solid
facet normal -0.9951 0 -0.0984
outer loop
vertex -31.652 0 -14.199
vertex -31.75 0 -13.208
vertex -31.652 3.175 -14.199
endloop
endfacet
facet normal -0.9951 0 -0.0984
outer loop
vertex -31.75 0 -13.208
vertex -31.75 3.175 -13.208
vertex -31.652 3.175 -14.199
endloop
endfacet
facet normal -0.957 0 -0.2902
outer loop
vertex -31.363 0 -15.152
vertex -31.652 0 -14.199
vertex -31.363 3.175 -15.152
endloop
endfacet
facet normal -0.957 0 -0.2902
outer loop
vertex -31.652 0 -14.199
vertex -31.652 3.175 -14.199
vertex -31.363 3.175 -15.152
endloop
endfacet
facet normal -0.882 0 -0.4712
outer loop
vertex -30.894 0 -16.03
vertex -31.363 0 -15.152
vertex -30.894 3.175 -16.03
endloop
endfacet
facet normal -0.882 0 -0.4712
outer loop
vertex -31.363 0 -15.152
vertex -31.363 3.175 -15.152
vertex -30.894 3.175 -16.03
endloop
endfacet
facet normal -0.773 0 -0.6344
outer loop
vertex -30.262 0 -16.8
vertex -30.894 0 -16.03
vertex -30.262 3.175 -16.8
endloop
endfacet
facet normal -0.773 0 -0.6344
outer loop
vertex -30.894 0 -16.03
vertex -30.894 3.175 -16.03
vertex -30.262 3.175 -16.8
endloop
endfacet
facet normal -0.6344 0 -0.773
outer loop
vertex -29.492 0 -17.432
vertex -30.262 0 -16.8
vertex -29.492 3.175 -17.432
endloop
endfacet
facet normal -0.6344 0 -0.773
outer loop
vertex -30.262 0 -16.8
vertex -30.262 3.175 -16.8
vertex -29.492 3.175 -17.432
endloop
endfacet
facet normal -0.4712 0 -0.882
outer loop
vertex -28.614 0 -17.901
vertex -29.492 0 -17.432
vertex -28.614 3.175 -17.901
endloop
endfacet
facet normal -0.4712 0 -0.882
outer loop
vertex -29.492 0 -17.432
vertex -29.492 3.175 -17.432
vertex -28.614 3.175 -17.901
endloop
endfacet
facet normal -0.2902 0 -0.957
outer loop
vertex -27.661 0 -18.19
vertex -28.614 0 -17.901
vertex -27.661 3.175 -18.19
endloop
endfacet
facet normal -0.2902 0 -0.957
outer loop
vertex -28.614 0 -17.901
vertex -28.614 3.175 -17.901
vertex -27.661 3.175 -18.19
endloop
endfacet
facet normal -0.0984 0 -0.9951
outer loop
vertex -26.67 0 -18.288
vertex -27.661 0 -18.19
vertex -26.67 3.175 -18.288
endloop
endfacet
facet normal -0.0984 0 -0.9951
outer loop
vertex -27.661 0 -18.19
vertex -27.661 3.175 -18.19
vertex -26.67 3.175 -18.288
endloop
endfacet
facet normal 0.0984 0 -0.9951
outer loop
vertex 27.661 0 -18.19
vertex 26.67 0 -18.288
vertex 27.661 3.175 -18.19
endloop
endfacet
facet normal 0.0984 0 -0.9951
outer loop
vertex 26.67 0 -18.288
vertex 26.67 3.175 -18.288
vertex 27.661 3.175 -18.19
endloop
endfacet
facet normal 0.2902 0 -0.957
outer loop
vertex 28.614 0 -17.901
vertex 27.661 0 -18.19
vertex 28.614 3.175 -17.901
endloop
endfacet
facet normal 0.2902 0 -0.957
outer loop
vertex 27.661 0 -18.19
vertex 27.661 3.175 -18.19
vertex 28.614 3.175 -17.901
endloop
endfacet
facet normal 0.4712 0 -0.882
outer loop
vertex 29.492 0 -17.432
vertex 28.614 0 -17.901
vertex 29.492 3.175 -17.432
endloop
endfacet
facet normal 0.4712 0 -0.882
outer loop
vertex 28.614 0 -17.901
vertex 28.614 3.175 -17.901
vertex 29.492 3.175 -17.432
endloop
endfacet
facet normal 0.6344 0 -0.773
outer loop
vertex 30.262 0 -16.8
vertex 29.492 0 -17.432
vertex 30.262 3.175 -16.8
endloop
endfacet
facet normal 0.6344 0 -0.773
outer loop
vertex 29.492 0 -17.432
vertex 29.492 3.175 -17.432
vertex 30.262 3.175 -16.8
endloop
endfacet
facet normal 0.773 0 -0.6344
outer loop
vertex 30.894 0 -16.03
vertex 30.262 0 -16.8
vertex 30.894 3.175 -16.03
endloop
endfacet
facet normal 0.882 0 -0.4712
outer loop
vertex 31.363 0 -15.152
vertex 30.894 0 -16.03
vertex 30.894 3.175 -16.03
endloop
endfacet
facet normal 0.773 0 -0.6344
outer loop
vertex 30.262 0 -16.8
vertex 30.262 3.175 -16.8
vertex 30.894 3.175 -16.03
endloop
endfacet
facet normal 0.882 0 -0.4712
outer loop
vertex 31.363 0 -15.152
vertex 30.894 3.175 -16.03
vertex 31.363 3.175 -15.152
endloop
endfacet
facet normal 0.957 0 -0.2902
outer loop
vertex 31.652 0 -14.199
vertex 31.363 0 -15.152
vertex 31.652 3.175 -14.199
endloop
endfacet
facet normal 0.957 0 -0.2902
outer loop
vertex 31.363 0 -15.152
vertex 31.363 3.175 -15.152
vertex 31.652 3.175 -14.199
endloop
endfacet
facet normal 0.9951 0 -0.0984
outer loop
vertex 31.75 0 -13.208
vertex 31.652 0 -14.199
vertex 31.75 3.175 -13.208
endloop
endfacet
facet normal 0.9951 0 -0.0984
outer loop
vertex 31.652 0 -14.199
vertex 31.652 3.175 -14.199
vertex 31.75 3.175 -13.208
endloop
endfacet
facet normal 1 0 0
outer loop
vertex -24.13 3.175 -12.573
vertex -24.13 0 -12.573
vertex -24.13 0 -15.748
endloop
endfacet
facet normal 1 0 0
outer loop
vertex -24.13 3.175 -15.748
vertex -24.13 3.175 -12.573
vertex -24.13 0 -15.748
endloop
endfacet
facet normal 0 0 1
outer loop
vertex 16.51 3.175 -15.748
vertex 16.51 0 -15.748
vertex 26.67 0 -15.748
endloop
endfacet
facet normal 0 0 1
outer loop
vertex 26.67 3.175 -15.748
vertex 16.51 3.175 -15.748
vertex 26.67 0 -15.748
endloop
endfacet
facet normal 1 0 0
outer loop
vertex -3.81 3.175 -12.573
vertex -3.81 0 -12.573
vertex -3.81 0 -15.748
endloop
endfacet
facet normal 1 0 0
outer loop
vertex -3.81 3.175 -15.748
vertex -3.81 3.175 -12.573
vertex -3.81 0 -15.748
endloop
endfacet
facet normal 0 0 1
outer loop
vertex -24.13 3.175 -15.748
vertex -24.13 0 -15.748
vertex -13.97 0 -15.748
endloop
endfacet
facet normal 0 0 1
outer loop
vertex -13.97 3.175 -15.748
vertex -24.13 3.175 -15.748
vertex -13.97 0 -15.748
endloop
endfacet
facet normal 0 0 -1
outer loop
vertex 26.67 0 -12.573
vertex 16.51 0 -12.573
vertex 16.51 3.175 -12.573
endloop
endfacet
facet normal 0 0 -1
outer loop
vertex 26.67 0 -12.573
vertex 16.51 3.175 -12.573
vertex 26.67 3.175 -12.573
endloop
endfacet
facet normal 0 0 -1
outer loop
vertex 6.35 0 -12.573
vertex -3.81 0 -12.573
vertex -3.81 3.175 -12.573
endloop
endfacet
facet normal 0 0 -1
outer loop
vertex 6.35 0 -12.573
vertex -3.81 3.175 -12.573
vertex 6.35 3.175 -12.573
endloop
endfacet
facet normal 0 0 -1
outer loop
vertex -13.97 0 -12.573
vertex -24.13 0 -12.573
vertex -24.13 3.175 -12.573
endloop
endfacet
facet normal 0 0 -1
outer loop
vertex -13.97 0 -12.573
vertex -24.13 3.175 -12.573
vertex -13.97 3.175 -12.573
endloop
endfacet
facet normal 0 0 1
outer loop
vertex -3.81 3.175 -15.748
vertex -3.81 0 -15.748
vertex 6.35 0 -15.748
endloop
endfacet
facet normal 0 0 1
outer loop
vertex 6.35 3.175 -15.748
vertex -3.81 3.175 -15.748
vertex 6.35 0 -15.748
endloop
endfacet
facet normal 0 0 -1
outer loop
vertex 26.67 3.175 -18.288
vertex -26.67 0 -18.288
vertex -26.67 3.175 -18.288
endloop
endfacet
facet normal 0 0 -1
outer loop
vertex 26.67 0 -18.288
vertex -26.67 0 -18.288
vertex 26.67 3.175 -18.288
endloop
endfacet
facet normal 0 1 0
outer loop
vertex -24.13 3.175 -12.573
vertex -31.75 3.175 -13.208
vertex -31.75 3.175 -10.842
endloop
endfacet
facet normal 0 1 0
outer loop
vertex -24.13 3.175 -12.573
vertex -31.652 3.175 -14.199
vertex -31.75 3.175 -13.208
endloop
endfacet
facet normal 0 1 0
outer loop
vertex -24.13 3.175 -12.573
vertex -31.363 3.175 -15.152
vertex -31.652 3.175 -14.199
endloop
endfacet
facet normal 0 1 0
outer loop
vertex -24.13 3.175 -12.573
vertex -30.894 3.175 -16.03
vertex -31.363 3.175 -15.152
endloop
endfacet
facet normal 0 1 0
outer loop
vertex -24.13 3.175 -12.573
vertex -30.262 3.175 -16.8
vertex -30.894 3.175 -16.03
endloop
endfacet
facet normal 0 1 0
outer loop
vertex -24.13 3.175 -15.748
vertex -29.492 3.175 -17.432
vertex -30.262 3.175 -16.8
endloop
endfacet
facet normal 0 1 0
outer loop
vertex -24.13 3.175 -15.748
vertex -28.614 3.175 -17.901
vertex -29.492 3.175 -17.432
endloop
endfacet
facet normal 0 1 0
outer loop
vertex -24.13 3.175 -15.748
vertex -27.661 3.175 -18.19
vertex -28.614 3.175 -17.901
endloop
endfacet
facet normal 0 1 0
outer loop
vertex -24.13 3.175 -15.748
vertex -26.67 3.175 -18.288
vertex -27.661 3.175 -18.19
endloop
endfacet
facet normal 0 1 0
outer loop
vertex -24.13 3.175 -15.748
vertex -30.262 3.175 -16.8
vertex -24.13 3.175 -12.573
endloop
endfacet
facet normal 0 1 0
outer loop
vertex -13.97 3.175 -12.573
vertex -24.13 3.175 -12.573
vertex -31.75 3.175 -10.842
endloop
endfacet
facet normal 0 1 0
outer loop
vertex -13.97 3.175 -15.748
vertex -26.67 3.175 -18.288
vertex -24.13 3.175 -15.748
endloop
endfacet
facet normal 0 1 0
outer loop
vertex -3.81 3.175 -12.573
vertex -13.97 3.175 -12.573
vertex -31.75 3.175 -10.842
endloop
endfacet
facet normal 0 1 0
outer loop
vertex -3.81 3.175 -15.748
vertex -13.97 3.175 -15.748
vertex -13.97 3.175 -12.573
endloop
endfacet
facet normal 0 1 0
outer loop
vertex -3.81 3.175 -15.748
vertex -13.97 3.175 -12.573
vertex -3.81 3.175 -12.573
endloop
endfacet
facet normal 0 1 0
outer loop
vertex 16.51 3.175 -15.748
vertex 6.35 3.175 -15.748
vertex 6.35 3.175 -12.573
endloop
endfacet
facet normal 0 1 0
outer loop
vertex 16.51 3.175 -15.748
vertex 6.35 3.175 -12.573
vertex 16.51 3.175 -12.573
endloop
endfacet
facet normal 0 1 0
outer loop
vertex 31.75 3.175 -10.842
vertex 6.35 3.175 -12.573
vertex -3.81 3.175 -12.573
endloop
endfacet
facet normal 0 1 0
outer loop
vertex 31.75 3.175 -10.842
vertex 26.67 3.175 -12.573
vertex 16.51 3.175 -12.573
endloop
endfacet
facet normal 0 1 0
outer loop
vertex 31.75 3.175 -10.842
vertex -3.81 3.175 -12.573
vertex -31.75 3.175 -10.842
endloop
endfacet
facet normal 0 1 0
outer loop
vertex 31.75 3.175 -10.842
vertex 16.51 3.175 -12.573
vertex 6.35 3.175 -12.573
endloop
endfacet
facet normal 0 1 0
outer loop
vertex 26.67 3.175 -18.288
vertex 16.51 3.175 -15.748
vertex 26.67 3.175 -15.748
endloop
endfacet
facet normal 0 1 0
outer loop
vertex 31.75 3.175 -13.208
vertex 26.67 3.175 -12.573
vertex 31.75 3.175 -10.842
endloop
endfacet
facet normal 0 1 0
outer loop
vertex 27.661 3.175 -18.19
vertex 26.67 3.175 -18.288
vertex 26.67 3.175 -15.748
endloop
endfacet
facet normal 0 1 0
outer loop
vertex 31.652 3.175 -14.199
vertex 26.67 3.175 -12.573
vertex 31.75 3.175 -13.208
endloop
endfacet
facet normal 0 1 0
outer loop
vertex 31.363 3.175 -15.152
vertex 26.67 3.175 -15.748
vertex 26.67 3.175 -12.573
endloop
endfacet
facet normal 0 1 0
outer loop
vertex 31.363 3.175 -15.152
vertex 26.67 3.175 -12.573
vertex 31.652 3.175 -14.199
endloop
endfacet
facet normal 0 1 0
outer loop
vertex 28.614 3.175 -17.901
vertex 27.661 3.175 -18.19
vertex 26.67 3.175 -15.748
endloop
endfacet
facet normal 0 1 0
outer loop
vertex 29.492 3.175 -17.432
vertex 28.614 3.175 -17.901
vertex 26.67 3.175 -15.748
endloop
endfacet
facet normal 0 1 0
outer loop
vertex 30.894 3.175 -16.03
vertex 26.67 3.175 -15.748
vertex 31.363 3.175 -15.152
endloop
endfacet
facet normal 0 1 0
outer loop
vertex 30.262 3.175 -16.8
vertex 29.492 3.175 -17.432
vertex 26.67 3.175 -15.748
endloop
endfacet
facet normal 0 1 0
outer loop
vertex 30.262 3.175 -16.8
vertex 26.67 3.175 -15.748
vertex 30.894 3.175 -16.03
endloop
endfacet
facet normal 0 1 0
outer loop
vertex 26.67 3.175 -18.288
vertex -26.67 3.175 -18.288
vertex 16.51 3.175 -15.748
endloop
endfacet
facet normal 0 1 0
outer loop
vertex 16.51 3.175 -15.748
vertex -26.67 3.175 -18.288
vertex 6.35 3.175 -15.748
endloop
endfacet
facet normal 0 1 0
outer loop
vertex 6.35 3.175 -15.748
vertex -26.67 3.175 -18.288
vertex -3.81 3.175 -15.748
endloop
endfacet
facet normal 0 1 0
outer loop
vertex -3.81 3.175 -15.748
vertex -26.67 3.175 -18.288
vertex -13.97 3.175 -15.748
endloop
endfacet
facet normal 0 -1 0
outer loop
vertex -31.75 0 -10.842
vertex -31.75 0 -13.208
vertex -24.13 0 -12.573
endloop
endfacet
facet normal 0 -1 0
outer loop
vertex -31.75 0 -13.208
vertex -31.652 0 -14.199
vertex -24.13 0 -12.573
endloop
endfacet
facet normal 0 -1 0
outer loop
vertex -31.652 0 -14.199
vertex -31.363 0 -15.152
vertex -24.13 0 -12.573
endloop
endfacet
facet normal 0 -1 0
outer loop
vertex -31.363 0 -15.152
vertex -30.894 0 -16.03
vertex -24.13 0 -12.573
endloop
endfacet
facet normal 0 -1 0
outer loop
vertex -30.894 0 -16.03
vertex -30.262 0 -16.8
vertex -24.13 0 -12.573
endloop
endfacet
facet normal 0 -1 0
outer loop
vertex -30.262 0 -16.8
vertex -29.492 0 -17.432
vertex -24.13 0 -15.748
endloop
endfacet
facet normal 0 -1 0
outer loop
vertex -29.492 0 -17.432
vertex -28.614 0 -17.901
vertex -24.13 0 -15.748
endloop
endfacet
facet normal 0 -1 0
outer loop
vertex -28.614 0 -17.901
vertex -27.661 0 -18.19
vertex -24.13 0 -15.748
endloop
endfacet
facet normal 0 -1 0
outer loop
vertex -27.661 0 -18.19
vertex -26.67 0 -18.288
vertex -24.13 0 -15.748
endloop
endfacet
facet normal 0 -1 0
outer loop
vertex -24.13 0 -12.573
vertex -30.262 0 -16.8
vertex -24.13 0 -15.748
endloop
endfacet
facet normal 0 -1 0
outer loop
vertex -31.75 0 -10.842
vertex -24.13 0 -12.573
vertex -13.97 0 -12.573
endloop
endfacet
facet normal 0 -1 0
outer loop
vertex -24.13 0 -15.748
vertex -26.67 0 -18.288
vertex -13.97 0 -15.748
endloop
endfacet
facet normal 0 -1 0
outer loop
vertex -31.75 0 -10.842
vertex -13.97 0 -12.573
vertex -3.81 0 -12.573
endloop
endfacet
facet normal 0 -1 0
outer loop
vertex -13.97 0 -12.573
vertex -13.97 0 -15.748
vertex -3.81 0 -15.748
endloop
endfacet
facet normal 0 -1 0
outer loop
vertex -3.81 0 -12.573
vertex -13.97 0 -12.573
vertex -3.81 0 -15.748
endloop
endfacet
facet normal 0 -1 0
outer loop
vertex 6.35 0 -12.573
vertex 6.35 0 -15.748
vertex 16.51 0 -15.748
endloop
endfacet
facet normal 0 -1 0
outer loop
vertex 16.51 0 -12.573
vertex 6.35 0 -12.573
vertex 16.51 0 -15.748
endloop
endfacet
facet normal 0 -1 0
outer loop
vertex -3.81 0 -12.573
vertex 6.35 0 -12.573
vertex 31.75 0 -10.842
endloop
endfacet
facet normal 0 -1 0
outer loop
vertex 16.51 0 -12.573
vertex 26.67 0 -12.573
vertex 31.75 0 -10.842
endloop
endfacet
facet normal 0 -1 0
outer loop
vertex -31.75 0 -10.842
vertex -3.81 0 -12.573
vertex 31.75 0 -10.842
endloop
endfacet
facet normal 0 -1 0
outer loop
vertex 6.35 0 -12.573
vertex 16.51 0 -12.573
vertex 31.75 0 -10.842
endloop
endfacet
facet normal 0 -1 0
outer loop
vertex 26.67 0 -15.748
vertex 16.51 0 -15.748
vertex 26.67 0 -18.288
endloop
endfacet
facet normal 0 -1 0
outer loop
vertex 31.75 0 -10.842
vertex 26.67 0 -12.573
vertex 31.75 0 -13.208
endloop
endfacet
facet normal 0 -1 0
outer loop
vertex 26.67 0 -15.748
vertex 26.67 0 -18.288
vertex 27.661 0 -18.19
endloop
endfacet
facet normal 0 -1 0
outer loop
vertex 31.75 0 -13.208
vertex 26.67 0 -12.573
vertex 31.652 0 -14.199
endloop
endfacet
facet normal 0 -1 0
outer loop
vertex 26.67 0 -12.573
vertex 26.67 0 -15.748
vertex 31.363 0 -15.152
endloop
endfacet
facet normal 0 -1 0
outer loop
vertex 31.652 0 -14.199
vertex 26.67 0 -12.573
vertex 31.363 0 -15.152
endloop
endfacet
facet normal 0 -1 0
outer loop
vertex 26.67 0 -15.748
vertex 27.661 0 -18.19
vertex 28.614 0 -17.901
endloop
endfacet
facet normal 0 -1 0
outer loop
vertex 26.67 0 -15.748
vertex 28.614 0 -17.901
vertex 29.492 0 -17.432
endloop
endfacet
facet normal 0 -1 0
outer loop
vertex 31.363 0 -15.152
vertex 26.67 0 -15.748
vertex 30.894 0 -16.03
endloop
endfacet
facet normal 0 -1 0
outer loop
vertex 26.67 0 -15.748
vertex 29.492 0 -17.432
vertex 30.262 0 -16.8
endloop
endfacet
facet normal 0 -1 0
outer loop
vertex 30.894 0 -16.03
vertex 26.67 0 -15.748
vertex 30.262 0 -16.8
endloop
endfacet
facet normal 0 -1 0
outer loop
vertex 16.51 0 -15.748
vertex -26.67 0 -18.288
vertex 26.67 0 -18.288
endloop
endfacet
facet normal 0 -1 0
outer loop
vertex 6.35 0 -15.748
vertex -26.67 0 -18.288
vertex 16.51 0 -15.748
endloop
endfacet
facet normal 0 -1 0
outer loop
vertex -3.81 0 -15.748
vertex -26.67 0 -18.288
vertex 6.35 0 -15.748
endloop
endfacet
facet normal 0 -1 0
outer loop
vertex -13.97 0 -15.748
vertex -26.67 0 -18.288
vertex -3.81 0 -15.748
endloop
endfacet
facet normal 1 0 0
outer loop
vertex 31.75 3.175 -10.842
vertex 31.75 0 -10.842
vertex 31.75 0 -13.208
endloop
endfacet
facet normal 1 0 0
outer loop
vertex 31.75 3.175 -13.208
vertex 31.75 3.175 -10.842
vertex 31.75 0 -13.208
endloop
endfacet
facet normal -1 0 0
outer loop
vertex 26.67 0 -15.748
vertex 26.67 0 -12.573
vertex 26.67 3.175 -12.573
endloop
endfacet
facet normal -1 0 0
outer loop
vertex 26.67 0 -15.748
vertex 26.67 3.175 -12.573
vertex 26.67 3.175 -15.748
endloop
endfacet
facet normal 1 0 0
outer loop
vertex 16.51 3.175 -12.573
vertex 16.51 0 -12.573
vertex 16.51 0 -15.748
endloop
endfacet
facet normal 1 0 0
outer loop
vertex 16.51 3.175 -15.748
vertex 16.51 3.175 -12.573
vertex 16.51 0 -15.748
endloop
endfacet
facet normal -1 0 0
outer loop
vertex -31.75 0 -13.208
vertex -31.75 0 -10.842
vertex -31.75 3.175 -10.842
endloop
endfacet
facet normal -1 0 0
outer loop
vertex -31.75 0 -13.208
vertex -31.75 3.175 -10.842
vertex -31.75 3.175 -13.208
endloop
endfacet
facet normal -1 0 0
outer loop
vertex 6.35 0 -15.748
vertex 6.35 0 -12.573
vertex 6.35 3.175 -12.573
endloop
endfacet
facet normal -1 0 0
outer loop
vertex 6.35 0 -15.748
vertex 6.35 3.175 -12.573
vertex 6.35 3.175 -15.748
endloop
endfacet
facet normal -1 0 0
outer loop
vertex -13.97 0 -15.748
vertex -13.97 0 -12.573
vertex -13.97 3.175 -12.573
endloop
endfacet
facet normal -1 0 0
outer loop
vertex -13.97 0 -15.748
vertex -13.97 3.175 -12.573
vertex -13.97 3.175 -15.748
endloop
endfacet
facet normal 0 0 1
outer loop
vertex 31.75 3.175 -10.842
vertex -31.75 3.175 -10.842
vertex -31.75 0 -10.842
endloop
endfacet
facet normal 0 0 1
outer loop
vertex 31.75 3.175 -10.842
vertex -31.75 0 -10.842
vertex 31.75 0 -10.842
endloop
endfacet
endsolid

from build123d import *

# Parameters (mm, degrees)
SKETCH1_W            = 63.5
SKETCH1_H            = 33.401
SKETCH1_W_2          = 10.16
SKETCH1_H_2          = 3.175
SKETCH1_W_3          = 40.64
SKETCH1_H_3          = 20.066
MAIN_EXTRUSION_DEPTH = 3.175
SKETCH3_R            = 2.2225
MOUNTING_HOLES_DEPTH = 37.777630008
TAB_CUTOUT_DEPTH     = 37.777630008
FILLET1_R            = 5.08
SKETCH6_W            = 69.522251557
SKETCH6_H            = 29.320751893
CUT_EXTRUDE3_DEPTH   = 37.777630008


with BuildPart() as part:
    # Sketch1 → Main Extrusion (new body)
    with BuildSketch(Plane(origin=(0, 0, 0), x_dir=(1, 0, 0), z_dir=(0, 1, 0))):
        with Locations((0, 1.5875)):
            Rectangle(SKETCH1_W, SKETCH1_H)
        with Locations((21.59, 14.1605)):
            Rectangle(SKETCH1_W_2, SKETCH1_H_2, mode=Mode.SUBTRACT)
        with Locations((1.27, 14.1605)):
            Rectangle(SKETCH1_W_2, SKETCH1_H_2, mode=Mode.SUBTRACT)
        with Locations((-19.05, 14.1605)):
            Rectangle(SKETCH1_W_2, SKETCH1_H_2, mode=Mode.SUBTRACT)
        Rectangle(SKETCH1_W_3, SKETCH1_H_3, mode=Mode.SUBTRACT)
    extrude(amount=MAIN_EXTRUSION_DEPTH)

    # Sketch3 → Mounting Holes (cut, through all)
    with BuildSketch(Plane(origin=(0, 3.175, 0), x_dir=(1, 0, 0), z_dir=(0, 1, 0))):
        with Locations(Location((-24.992246486, 4.9657, 0), (0, 0, 270))):
            Circle(SKETCH3_R)
        with Locations(Location((-24.992246486, -4.9657, 0), (0, 0, 270))):
            Circle(SKETCH3_R)
        with Locations(Location((24.992246486, -4.9657, 0), (0, 0, 90))):
            Circle(SKETCH3_R)
        with Locations(Location((24.992246486, 4.9657, 0), (0, 0, 90))):
            Circle(SKETCH3_R)
    extrude(amount=-MOUNTING_HOLES_DEPTH, mode=Mode.SUBTRACT)

    # Sketch5 → Tab cutout (cut, through all)
    with BuildSketch(Plane(origin=(0, 3.175, 0), x_dir=(1, 0, 0), z_dir=(0, 1, 0))):
        Polygon((-20.32, 0), (-20.32, 0.889), (-27.305, 0.889), (-27.305, -0.889), (-20.32, -0.889), align=None)
        Polygon((27.305, -0.889), (20.32, -0.889), (20.32, 0), (20.32, 0.889), (27.305, 0.889), align=None)
    extrude(amount=-TAB_CUTOUT_DEPTH, mode=Mode.SUBTRACT)

    # Fillet1
    fillet1_edges = [part.edges().sort_by_distance(p)[0] for p in [
        (31.75, 1.5875, 15.113),
        (-31.75, 1.5875, 15.113),
        (-31.75, 1.5875, -18.288),
        (31.75, 1.5875, -18.288),
    ]]
    fillet(fillet1_edges, radius=FILLET1_R)

    # Sketch6 → Cut-Extrude3 (cut, through all)
    with BuildSketch(Plane(origin=(0, 3.175, 0), x_dir=(1, 0, 0), z_dir=(0, 1, 0))):
        with Locations((-0.129688159, -3.818782995)):
            Rectangle(SKETCH6_W, SKETCH6_H)
    extrude(amount=-CUT_EXTRUDE3_DEPTH, mode=Mode.SUBTRACT)


solid = part.part
